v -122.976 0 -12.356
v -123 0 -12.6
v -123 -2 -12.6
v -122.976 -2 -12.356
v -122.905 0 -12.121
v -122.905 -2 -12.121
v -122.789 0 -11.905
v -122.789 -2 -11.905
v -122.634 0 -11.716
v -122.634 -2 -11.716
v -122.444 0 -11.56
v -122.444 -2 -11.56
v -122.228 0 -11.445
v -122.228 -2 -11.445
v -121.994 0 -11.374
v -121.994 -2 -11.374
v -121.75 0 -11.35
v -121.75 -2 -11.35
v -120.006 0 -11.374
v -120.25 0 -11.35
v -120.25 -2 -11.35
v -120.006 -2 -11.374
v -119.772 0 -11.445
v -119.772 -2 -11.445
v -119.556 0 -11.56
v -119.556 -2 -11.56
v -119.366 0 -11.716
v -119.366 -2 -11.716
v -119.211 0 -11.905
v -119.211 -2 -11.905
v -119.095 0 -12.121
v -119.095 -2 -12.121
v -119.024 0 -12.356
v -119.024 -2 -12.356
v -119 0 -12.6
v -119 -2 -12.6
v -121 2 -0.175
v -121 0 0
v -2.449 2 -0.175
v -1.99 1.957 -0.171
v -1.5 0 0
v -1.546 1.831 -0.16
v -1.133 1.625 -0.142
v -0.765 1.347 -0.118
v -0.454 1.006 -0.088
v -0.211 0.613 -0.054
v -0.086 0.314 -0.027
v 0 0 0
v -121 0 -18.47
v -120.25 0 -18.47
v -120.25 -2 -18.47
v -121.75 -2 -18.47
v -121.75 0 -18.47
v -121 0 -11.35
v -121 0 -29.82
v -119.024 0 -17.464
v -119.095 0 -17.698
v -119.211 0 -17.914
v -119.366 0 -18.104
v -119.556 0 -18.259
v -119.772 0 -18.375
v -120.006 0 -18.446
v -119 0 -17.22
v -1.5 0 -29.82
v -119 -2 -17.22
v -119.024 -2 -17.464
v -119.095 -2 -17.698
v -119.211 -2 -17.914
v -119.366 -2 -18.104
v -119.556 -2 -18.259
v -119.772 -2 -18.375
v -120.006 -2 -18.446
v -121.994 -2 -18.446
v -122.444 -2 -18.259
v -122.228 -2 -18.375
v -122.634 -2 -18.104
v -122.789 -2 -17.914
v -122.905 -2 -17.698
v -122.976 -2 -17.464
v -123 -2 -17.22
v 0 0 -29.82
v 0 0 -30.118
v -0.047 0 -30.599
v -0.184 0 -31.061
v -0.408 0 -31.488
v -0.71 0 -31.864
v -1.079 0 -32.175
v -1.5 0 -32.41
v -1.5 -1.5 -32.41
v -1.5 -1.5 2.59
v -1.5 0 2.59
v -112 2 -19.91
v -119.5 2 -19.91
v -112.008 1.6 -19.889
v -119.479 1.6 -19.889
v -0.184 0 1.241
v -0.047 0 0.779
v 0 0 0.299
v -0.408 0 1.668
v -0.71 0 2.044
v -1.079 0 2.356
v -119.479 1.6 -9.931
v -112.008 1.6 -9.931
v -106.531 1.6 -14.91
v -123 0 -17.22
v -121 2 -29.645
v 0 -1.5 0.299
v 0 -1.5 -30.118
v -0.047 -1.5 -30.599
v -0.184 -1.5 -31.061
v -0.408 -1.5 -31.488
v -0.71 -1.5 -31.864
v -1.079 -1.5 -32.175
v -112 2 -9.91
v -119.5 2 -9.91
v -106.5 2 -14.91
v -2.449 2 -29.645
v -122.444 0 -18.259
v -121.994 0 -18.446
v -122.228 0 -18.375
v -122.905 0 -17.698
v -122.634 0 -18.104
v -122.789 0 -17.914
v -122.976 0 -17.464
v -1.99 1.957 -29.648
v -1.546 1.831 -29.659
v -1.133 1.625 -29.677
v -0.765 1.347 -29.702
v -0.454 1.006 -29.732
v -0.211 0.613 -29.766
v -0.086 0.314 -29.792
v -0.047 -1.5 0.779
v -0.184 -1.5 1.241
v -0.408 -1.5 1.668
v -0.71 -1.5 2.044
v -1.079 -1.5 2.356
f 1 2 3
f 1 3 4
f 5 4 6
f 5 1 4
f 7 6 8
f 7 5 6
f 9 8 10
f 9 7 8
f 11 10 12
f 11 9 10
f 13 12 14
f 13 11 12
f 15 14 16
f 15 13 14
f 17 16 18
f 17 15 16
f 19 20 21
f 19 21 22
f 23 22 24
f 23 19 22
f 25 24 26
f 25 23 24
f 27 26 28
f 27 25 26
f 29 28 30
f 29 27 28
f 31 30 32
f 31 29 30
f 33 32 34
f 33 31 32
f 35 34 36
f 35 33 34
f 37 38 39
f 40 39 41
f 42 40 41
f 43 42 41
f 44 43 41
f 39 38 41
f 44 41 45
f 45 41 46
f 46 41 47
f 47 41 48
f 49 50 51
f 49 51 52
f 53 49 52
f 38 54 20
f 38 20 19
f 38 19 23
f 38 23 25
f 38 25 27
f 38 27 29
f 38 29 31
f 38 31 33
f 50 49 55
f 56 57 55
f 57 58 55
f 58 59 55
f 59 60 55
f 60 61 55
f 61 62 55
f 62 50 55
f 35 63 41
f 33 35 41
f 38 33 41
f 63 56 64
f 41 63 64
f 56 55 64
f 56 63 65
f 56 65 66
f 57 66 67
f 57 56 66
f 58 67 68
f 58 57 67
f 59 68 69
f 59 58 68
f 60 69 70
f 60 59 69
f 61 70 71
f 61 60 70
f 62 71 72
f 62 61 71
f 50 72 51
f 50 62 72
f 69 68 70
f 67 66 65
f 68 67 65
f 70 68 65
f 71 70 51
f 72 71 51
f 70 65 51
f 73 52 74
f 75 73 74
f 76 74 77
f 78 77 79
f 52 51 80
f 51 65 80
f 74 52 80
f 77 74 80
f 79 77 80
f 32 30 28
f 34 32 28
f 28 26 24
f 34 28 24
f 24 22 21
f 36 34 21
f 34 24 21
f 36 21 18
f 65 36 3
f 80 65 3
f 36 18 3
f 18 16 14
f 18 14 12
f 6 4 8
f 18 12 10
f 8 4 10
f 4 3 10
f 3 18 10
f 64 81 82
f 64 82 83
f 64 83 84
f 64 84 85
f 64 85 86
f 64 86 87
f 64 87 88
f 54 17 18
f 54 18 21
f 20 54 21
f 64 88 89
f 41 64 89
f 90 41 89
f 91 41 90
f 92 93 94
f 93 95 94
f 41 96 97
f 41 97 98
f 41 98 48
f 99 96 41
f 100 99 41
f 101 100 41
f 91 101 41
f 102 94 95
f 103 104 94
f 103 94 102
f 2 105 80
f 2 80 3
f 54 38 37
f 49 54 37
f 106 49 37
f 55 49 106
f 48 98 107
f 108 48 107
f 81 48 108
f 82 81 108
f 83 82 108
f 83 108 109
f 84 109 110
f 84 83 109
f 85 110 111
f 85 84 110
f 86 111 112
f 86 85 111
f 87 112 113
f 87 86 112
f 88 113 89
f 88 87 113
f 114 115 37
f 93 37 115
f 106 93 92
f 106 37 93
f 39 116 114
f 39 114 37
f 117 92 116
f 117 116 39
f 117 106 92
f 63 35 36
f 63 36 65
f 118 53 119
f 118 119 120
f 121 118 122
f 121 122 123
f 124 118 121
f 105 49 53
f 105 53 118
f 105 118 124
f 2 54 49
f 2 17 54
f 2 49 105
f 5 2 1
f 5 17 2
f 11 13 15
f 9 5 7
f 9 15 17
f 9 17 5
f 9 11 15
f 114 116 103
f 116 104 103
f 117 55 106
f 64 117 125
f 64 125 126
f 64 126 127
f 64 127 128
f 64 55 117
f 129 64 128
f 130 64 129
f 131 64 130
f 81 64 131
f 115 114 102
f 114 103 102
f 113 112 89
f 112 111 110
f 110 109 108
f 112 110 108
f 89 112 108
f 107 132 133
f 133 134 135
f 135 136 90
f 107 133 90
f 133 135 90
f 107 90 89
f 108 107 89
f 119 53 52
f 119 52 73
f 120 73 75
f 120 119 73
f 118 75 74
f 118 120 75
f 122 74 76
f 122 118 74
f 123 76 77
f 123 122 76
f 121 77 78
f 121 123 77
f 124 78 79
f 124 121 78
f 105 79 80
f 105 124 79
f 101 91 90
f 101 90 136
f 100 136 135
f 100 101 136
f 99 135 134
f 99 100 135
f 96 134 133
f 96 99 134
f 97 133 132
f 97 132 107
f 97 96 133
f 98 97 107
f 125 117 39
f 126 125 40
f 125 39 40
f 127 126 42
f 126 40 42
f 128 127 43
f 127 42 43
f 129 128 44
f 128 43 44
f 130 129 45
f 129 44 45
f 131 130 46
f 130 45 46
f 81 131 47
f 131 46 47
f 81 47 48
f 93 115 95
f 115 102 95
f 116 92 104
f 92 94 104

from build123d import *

# Parameters (mm, degrees)
SKETCH2_W           = 121
SKETCH2_H           = 29.819553929
BASE_EXTRUDE_DEPTH  = 2
DRAFT1_ANGLE        = 5
FILLET3_R           = 2.5
BOSS_EXTRUDE1_DEPTH = 1.5
BOSS_EXTRUDE2_DEPTH = 2
CUT_EXTRUDE3_DEPTH  = 0.4
CUT_EXTRUDE3_TAPER  = 3


with BuildPart() as part:
    # Sketch2 → Base-Extrude (new body)
    with BuildSketch(Plane(origin=(0, 0, 0), x_dir=(1, 0, 0), z_dir=(0, 1, 0))):
        with Locations((-60.5, 14.909776965)):
            Rectangle(SKETCH2_W, SKETCH2_H)
    extrude(amount=BASE_EXTRUDE_DEPTH)

    # Draft1
    draft1_faces = [part.faces().sort_by_distance(p)[0] for p in [
        (-60.5, 1, 0),
        (-60.5, 1, -29.819553929),
    ]]
    draft(draft1_faces, Plane.ZX, DRAFT1_ANGLE)

    # Fillet3
    # the kernel refuses this fillet: 2.5 mm, written as the material it takes off along each edge
    with BuildSketch(Plane(origin=(0, 2, 5.94874703), x_dir=(-1.5669991185737358e-12, -1.0, 0), z_dir=(0, 0, -1))) as fillet3_piece_1:
        with BuildLine():
            CenterArc((2.5, 2.449489743), FILLET3_R, 180, 78.463040967)
            Line((0, 2.449489743), (-0.05, 2.449489743))
            Line((-0.05, 2.449489743), (-0.05, 0))
            Line((-0.05, 0), (0, -0.05))
            ThreePointArc((0, -0.05), (1, -0.05), (1.99, -0.048989795))
            Line((1.99, -0.048989795), (2, 0))
        make_face()
    extrude(amount=41.717047988, mode=Mode.SUBTRACT)

    # Sketch3 → Boss-Extrude1 (add)
    with BuildSketch(Plane.XZ):
        with BuildLine():
            Line((0, 0.298935188), (0, -30.118489117))
            ThreePointArc((0, -30.118489117), (-0.408349934, -31.487795511), (-1.5, -32.409776964))
            Line((-1.5, -32.409776964), (-1.5, 2.590223036))
            ThreePointArc((-1.5, 2.590223036), (-0.408349934, 1.668241582), (0, 0.298935188))
        make_face()
    extrude(amount=BOSS_EXTRUDE1_DEPTH)

    # Sketch4 → Boss-Extrude2 (add)
    with BuildSketch(Plane.XZ):
        with BuildLine():
            Line((-120.25, -18.469776964), (-121.75, -18.469776964))
            ThreePointArc((-121.75, -18.469776964), (-122.633883476, -18.103660441), (-123, -17.219776964))
            Line((-123, -17.219776964), (-123, -12.599776964))
            ThreePointArc((-123, -12.599776964), (-122.633883476, -11.715893488), (-121.75, -11.349776964))
            Line((-121.75, -11.349776964), (-120.25, -11.349776964))
            ThreePointArc((-120.25, -11.349776964), (-119.366116524, -11.715893488), (-119, -12.599776964))
            Line((-119, -12.599776964), (-119, -17.219776964))
            ThreePointArc((-119, -17.219776964), (-119.366116524, -18.103660441), (-120.25, -18.469776964))
        make_face()
    extrude(amount=BOSS_EXTRUDE2_DEPTH)

    # Sketch5 → Cut-Extrude3 (cut)
    with BuildSketch(Plane(origin=(-217.927600689, 2, 0), x_dir=(1, 0, 0), z_dir=(0, -1, 0))):
        Polygon((105.927600689, -19.909776964), (111.427600689, -14.909776964), (105.927600689, -9.909776964), (98.427600689, -9.909776964), (98.427600689, -19.909776964), align=None)
    extrude(amount=CUT_EXTRUDE3_DEPTH, taper=CUT_EXTRUDE3_TAPER, mode=Mode.SUBTRACT)


solid = part.part
